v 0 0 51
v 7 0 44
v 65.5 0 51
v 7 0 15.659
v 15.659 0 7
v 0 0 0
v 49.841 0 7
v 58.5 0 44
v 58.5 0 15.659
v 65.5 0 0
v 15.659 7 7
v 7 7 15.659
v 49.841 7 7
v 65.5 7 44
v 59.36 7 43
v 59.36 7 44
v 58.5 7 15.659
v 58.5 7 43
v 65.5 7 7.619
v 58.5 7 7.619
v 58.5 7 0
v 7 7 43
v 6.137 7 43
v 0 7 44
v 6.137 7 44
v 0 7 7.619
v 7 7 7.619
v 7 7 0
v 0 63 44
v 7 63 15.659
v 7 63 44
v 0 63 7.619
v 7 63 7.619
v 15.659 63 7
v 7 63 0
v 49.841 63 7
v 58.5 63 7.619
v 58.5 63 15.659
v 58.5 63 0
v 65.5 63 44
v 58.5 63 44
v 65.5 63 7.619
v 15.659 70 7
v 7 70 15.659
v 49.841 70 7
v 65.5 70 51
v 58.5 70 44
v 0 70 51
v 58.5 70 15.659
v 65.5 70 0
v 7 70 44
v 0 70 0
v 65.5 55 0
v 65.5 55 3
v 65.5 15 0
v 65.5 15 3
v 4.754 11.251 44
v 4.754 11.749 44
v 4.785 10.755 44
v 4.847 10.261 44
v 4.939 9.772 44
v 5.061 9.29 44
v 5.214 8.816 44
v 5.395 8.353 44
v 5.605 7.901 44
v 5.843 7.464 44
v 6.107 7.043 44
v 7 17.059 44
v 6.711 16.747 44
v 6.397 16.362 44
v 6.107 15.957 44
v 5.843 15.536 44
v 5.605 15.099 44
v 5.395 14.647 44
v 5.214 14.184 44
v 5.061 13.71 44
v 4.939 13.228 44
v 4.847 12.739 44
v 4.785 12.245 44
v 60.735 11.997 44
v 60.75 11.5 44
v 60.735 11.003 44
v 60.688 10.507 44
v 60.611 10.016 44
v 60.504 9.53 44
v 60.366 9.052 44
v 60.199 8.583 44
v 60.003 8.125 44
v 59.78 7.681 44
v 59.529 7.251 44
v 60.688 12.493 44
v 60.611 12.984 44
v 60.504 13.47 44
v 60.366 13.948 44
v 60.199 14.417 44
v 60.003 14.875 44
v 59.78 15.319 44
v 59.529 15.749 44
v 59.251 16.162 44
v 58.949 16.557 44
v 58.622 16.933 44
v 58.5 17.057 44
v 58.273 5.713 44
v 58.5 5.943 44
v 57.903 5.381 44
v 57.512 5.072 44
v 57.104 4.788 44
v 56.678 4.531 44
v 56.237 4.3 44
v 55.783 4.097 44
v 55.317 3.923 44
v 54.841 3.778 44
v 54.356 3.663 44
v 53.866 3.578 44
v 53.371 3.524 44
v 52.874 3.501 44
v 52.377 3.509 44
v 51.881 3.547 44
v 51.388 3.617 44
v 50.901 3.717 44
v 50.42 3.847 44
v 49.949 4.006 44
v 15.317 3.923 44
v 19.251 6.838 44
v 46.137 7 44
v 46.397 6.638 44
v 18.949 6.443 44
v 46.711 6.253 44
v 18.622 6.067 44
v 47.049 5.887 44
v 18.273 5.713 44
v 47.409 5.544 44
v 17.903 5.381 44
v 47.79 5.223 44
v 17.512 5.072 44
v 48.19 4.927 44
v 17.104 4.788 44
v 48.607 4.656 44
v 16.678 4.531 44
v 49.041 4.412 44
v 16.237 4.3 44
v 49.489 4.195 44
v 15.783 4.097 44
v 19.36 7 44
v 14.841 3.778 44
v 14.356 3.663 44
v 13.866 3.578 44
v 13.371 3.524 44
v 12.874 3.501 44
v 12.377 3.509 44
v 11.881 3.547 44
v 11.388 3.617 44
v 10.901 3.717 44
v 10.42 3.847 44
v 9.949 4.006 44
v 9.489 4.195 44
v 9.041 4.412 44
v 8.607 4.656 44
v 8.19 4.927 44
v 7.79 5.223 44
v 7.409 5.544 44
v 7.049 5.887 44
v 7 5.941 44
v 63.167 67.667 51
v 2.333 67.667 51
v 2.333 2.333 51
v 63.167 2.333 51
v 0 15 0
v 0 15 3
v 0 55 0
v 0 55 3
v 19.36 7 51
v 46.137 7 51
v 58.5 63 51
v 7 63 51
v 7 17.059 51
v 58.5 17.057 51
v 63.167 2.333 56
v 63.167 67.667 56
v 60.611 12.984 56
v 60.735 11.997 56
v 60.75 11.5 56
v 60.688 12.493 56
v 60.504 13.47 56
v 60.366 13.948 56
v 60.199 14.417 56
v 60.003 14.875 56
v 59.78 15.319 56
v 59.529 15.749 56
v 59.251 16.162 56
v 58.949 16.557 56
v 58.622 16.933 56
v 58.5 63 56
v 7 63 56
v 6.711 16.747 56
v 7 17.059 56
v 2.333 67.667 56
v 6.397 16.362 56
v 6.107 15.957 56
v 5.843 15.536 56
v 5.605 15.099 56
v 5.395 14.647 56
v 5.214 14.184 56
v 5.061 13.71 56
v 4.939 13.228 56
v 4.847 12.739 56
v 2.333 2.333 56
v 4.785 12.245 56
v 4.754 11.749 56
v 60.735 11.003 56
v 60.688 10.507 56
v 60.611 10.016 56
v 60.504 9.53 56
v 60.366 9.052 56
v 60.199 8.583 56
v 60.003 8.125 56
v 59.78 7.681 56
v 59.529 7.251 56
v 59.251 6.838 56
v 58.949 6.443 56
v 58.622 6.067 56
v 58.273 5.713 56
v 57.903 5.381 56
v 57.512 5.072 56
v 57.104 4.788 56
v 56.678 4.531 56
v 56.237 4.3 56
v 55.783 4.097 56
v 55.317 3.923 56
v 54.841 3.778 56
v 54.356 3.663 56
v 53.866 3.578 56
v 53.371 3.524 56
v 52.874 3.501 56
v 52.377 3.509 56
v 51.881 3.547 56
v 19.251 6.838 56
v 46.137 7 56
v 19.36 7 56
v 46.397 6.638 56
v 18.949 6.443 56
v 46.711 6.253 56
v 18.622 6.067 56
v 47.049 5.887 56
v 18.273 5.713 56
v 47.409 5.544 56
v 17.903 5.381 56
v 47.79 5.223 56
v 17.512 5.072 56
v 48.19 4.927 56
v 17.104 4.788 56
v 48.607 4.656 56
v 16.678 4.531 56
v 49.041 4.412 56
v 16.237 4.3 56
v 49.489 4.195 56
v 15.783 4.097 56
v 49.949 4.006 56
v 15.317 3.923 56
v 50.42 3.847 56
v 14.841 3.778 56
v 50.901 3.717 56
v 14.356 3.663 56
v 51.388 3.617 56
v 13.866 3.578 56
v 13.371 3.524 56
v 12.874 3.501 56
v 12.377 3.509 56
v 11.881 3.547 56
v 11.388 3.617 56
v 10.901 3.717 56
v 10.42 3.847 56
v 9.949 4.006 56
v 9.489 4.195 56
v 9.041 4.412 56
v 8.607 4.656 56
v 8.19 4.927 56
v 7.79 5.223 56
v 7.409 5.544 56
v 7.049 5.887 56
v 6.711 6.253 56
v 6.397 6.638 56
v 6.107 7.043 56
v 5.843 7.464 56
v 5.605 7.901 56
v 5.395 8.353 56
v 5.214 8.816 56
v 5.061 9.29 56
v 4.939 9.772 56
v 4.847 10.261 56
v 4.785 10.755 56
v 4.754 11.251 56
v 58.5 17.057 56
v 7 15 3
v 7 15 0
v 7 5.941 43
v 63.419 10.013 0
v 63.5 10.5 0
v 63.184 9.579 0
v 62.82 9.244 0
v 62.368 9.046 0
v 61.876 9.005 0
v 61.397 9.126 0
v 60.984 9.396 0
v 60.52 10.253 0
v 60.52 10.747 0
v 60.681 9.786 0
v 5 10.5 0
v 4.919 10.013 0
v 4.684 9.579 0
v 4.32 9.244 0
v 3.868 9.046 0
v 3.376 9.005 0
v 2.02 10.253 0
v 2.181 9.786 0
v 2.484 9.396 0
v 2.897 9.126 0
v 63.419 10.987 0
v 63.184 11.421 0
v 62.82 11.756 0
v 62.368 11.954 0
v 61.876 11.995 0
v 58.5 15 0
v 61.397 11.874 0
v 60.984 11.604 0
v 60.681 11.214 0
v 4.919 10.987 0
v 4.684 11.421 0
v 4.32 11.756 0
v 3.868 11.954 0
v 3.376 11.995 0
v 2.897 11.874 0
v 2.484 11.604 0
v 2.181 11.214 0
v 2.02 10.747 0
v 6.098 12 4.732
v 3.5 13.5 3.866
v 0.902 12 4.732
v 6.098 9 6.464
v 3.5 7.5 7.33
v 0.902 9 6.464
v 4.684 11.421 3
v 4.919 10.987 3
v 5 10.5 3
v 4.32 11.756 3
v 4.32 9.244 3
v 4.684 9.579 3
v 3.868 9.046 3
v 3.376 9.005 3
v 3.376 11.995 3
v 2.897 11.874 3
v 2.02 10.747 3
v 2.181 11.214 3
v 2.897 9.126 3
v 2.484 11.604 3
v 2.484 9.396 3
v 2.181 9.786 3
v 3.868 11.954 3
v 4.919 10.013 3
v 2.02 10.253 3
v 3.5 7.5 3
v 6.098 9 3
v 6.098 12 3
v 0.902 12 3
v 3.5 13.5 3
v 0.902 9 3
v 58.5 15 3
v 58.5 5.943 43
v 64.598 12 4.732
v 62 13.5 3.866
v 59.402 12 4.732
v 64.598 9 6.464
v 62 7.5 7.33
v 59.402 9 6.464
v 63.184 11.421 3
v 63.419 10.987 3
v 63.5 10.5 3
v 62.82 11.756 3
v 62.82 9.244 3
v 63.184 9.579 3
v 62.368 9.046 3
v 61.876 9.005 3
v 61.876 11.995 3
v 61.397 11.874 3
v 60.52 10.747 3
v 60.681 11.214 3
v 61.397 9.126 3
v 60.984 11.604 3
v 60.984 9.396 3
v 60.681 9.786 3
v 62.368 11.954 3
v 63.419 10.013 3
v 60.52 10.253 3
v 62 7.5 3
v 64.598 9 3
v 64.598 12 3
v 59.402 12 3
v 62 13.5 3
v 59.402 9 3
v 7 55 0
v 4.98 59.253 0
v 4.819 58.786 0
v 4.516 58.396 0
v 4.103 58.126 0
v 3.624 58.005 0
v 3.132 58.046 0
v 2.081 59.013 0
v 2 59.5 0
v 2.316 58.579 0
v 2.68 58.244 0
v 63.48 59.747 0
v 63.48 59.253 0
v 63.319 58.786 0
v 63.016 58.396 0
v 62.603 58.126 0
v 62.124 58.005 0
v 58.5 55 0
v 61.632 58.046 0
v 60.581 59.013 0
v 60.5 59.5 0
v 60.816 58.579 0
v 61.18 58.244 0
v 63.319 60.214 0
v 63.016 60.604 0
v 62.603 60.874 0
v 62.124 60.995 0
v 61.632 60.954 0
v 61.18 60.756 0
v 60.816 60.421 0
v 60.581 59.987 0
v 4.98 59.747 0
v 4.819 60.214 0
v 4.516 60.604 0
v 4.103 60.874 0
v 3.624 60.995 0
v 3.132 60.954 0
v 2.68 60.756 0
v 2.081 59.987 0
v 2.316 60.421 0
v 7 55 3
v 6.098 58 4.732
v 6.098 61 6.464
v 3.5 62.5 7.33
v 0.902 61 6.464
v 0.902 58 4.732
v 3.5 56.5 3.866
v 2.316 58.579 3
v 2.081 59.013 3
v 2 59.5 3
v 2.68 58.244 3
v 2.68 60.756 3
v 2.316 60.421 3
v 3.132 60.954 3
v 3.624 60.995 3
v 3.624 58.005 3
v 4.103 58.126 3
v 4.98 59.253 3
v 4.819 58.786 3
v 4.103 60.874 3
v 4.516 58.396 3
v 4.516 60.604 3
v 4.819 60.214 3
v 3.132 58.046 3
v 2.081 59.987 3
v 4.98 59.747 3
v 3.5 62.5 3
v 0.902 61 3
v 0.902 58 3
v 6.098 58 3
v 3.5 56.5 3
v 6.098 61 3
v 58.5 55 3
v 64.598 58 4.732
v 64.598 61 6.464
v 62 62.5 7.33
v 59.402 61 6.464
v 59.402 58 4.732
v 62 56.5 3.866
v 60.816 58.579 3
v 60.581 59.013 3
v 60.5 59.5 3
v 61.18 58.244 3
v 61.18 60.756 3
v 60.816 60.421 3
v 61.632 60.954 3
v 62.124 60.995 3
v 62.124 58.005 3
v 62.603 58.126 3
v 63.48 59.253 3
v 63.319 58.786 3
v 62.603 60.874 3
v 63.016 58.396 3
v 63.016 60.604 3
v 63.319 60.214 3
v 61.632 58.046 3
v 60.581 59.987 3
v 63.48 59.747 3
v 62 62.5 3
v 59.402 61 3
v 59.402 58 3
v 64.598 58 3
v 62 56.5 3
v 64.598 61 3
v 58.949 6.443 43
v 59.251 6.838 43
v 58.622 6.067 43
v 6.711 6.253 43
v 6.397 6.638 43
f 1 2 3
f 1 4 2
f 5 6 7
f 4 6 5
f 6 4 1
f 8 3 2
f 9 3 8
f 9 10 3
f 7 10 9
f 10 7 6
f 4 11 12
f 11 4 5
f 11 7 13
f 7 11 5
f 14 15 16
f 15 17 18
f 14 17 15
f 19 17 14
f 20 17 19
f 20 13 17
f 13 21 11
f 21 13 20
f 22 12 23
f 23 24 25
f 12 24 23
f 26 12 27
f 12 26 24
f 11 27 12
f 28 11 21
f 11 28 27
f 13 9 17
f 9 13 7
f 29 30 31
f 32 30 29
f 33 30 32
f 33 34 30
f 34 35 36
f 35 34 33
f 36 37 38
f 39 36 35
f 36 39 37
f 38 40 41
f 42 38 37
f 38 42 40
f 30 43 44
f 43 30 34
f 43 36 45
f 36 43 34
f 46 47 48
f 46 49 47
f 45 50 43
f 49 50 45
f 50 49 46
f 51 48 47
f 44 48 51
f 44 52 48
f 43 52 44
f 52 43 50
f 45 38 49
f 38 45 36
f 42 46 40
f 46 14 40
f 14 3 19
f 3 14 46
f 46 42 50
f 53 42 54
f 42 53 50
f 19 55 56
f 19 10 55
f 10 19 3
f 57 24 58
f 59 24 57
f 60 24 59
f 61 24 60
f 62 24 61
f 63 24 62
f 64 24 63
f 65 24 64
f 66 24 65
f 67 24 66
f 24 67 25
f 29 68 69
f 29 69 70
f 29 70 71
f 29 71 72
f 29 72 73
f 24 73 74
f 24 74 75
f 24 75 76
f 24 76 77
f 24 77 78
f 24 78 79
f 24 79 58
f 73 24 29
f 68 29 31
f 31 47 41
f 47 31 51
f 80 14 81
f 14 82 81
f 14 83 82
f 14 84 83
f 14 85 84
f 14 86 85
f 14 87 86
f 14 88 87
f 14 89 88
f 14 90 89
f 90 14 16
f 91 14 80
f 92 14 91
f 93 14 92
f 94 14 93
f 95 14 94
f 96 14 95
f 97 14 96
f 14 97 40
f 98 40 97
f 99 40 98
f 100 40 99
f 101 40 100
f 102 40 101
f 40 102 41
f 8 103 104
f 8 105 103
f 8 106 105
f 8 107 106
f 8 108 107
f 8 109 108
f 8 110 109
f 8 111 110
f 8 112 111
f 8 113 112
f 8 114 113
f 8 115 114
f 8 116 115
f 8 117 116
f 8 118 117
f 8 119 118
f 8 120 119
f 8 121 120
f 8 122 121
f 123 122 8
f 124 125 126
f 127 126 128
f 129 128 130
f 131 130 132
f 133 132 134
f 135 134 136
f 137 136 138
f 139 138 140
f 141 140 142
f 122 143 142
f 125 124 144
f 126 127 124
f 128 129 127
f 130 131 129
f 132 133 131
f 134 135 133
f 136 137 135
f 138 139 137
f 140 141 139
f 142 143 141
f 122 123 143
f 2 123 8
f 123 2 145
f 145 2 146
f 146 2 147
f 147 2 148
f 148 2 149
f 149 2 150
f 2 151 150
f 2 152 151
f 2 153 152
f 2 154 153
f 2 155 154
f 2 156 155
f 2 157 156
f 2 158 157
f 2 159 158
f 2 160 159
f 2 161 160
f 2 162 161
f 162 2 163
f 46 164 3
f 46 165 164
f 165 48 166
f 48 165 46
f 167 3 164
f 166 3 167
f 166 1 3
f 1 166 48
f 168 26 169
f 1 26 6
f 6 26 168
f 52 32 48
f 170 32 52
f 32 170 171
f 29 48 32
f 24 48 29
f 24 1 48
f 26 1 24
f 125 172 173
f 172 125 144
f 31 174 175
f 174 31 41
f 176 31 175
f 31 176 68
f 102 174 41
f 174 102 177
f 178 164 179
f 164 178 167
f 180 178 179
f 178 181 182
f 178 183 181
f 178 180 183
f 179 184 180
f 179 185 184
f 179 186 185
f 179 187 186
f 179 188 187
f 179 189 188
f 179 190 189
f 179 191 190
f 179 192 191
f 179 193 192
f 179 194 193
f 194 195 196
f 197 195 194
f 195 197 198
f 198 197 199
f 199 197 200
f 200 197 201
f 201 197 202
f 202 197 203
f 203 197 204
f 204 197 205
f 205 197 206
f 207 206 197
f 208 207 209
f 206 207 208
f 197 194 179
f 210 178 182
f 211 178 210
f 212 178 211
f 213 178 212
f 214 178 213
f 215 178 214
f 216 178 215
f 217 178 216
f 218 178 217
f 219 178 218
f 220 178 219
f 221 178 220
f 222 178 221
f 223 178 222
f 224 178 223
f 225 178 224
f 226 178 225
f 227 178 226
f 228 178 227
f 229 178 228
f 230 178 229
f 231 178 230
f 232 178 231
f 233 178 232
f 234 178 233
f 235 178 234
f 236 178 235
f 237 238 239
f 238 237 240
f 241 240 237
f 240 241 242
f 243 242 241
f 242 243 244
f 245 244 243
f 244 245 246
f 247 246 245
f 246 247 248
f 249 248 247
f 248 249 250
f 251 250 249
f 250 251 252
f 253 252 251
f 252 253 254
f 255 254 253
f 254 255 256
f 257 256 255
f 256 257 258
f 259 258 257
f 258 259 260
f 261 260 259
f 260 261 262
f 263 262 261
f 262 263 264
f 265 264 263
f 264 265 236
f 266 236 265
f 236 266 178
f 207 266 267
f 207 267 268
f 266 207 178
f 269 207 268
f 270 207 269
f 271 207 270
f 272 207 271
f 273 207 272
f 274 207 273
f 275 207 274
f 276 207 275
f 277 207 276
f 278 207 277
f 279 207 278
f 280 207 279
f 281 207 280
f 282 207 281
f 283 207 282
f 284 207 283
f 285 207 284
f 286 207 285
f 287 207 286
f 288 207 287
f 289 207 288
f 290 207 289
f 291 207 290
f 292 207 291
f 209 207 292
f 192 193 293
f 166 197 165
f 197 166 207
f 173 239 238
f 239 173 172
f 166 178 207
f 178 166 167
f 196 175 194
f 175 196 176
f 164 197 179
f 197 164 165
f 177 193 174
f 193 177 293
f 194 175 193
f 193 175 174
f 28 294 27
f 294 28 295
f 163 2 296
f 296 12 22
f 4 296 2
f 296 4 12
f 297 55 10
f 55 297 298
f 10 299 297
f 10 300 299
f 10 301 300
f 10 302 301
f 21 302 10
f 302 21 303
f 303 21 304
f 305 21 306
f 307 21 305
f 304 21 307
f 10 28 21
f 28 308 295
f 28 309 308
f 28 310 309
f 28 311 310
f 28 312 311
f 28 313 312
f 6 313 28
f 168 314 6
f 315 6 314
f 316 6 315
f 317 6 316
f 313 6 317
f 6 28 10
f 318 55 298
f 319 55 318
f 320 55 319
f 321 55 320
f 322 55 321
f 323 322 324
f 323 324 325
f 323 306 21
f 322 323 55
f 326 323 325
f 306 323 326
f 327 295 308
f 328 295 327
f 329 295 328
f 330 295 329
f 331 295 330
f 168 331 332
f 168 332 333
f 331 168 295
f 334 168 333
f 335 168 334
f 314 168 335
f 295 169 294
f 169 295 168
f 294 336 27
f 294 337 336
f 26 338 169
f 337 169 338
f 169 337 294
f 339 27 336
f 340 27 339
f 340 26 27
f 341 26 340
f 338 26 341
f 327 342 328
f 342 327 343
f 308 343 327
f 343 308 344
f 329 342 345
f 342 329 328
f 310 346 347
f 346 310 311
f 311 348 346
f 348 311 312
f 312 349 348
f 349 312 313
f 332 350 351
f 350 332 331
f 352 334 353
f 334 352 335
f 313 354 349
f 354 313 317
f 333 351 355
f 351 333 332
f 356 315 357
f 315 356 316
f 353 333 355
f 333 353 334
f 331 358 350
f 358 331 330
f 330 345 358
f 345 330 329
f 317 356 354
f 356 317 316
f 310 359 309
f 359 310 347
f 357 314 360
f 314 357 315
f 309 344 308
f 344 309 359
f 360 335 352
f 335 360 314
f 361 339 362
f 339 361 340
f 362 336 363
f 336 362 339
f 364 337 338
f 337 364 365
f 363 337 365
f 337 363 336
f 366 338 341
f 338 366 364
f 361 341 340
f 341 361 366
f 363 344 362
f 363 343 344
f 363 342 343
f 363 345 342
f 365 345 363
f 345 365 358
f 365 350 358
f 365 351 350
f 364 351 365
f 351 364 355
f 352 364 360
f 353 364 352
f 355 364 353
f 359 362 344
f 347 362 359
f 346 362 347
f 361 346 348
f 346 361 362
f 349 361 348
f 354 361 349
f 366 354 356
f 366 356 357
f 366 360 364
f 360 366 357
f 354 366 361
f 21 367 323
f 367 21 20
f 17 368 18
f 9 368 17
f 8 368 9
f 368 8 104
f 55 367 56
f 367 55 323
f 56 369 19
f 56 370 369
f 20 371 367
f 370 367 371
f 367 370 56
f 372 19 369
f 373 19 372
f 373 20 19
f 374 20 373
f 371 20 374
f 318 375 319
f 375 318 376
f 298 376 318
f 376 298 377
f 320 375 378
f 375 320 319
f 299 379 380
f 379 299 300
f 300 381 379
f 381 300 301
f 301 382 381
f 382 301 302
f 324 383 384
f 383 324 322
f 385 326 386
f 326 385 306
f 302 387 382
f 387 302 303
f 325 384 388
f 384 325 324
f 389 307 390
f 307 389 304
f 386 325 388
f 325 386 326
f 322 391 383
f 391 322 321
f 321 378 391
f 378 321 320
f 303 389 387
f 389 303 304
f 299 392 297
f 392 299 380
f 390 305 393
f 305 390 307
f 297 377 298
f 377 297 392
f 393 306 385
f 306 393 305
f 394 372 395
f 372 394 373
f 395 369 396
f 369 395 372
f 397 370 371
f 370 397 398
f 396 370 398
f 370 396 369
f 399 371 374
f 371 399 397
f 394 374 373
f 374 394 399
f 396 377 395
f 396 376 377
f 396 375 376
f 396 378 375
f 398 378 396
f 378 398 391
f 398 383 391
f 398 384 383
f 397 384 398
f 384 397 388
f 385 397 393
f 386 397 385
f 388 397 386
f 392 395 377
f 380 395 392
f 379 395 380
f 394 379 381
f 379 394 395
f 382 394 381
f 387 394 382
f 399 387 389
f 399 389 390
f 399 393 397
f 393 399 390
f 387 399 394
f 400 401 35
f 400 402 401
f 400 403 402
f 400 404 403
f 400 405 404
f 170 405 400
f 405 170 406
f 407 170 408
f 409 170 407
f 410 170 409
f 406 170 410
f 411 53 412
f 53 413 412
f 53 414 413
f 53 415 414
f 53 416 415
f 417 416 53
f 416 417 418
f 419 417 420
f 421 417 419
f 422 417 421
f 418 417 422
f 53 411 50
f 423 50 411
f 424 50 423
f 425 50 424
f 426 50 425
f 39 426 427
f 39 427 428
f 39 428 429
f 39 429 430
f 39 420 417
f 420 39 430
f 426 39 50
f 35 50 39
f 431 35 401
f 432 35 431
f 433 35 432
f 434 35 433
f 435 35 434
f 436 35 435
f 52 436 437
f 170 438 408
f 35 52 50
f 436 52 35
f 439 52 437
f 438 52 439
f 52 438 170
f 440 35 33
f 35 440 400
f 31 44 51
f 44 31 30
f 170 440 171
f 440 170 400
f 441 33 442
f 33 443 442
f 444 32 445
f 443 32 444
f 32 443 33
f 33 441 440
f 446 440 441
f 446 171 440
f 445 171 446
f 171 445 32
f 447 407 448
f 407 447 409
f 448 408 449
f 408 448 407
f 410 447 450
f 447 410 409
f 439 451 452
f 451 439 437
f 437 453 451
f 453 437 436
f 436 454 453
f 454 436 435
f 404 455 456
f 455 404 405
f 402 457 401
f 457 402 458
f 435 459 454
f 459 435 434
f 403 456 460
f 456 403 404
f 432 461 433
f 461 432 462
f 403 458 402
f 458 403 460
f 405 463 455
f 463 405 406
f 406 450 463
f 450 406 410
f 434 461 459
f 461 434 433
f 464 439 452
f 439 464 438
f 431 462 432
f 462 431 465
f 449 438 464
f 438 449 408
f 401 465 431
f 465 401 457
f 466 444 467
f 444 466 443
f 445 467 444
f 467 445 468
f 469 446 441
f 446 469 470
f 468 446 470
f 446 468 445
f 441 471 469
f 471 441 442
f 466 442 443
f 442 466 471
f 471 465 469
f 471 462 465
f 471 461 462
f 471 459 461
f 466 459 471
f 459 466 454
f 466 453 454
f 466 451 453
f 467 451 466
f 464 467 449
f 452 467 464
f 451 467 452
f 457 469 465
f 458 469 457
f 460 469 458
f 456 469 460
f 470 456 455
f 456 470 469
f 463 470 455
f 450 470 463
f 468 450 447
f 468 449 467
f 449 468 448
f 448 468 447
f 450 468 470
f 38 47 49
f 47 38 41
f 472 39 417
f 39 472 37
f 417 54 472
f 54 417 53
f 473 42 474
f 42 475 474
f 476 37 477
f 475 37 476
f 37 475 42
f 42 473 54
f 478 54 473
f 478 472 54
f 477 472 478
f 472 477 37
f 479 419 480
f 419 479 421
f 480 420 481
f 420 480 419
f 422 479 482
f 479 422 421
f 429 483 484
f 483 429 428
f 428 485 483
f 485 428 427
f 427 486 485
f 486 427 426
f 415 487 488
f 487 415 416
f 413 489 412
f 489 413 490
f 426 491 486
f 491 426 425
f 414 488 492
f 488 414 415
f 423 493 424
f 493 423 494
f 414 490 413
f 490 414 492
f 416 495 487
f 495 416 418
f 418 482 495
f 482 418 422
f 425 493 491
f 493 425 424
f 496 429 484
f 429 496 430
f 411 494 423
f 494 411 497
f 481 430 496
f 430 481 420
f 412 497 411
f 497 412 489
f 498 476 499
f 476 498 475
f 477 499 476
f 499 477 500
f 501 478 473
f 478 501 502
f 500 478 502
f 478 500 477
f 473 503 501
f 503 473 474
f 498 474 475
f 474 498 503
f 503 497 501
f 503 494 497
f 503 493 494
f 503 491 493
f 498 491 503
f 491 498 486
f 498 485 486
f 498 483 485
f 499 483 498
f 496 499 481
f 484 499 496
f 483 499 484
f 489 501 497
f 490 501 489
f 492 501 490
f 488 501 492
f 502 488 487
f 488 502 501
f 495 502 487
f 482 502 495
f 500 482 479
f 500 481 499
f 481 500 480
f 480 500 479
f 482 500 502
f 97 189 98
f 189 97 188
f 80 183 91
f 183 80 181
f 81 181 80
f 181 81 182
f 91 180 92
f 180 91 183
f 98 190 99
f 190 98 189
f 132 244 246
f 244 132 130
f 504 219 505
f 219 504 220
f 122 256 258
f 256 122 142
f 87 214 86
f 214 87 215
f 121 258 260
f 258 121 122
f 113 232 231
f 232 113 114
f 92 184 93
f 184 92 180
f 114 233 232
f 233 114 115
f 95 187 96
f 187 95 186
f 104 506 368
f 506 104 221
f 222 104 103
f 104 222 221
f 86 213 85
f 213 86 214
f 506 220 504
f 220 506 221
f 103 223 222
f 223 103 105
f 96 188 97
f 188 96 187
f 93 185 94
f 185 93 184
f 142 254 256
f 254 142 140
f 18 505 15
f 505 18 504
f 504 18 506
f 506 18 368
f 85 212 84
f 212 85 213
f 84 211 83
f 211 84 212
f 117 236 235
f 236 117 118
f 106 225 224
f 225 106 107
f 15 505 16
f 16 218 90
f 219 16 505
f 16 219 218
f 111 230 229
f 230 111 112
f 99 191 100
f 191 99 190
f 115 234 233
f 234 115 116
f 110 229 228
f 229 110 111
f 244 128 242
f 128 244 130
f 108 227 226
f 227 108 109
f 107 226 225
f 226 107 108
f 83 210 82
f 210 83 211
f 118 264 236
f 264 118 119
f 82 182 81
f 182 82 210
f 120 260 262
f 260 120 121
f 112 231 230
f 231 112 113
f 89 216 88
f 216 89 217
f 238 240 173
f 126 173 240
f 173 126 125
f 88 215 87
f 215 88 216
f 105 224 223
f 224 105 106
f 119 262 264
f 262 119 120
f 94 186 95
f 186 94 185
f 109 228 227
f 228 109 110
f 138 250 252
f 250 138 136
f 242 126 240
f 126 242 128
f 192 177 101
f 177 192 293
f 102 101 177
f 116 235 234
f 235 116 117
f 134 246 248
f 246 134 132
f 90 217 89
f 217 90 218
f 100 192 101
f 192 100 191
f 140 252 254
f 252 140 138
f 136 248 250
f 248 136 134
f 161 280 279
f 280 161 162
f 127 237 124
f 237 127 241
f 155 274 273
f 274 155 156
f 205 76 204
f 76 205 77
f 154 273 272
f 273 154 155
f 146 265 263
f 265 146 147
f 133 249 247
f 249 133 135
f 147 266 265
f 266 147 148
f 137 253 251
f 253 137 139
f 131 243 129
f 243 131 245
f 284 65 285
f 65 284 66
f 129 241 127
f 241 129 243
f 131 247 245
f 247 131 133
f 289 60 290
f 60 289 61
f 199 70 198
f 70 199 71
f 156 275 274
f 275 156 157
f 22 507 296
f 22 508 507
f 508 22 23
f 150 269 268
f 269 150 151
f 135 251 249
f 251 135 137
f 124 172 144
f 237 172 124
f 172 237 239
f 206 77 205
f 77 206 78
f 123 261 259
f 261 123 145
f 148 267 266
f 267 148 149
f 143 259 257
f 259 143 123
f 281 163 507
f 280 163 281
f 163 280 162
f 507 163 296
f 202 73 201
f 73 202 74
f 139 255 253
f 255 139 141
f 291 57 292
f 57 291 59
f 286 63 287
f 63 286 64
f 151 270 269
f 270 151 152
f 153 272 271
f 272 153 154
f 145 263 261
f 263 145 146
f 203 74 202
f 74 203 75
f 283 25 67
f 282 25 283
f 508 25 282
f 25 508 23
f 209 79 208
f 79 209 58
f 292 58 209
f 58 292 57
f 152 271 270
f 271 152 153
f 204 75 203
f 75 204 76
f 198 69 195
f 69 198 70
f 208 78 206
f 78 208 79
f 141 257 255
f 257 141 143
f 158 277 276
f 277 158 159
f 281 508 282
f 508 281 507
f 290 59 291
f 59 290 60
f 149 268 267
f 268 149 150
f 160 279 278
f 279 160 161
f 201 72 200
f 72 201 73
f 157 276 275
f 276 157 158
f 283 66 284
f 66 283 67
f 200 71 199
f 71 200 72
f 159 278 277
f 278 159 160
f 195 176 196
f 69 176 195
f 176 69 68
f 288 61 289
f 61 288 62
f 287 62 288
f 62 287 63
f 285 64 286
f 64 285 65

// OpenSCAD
// file: prism.scad
module prism(l, w, h) {
       polyhedron(points=[
               [0,0,h],           // 0    front top corner
               [0,0,0],[w,0,0],   // 1, 2 front left & right bottom corners
               [0,l,h],           // 3    back top corner
               [0,l,0],[w,l,0]    // 4, 5 back left & right bottom corners
       ], faces=[ // points for all faces must be ordered clockwise when looking in
               [0,2,1],    // top face
               [3,4,5],    // base face
               [0,1,4,3],  // h face
               [1,2,5,4],  // w face
               [0,3,5,2],  // hypotenuse face
       ]);
}

//rotate([180,0,0]) prism(l=5, w=3, h=5);
// main file
/*

Structure that connects to the Raspberry Pi and holds the camera translation stage above it. 
top.scad fits onto the top, the cylindrical spaces in the fitting make room for screws.

*/

include <prism.scad>;

$fa = 0.5;
$fs = 0.5;

bolt_separation = 49;

//height of the setup, NOT including the "fitting"
height = 51;

//dimensions of the "feet", part of the legs which stick out and have holes to attach to the Raspberry Pi
foot_width = 7;
foot_length = 6 + 0.5 + 0.5 + 1;
foot_thickness = 3;
//radii of the holes in the feet
foot_r = 1.5;
nut_r = 3;

//distance by which the structure is larger than the Raspberry Pi board, which therefore corresponds to the thickness of the legs ang "beam" which connect the legs
extra = 7;

//the - 1 is since the holes in the feel arent at foot_length/2 but at foot_length/2 - 0.5.
top_width = bolt_separation + 2*extra + foot_length - 1;
//the last +0.5 is tolerance so that the legs aren't that close to the actual LEDs
top_length = 58 + 3 + 3 + 0.5 + 0.5 + 0.5;
top_length = (58 + 3 + 3 + 0.5 + 0.5) + 0.5;
top_thickness = 2;

total_length = 85;
beam_height = extra;
fitting_height = 5;
//the corresponding fitting on top.scad is extra/3 minus some tolerance
fitting_width = extra/3*2;

angle = 30;
prism_height = (foot_length+extra) * tan(angle);

hole_height = 2.5;
hole_r = 2;

module leg(){
    
    difference(){
        union(){
            //foot
            cube([foot_width,foot_length+extra,foot_thickness]);
            //leg
            cube([foot_width, extra, height]);
            //prism
            rotate([0,0,90]) translate([0,-foot_width,foot_thickness]) prism(foot_width,foot_length + extra,prism_height);
        };
        
        translate([foot_width/2, extra+foot_length/2 - 0.5,-1]) 
        union(){
           cylinder(r=foot_r, h=foot_thickness+2);
           translate([0,0,1+foot_thickness]) rotate([0,0,30]) cylinder(r=nut_r, h=prism_height, $fn = 6);
        };
    };
};


// beam refers to the horizontal cuboids that connect the "legs"
module beam(length){
    cube([length,extra,beam_height]); 
};

// fitting refers to the square at the top of the structure, that is meant to fit into the "fitting" on top.scad
module fitting(width,length,thickness){
    cube([length,thickness,fitting_height]);
    cube([thickness,width,fitting_height]);
    translate([length-thickness,0,0]) cube([thickness,width,fitting_height]);
    translate([0,width-thickness,0]) cube([length,thickness,fitting_height]);
}






//lower beams
beam(top_length);
translate([0,top_width-extra,0]) beam(top_length);
union(){
        translate([foot_width-0.001,0,beam_height]) prism(extra,prism_height,prism_height);
        rotate([0,0,180]) translate([-0.001-top_length+foot_width,-extra,beam_height]) prism(extra,prism_height,prism_height);
    };
translate([0,top_width-extra,0]) union(){
        translate([foot_width-0.001,0,beam_height]) prism(extra,prism_height,prism_height);
        rotate([0,0,180]) translate([-0.001-top_length+foot_width,-extra,beam_height]) prism(extra,prism_height,prism_height);
    };


difference(){
    union(){
        //higher beams
        translate([0,extra,height]) rotate([180,0,0]){
            beam(top_length);
            translate([0,-top_width+extra,0]) beam(top_length);
        };
        translate([0,0,height]) rotate([180,0,90]){
            beam(top_width);
            translate([0,top_length-foot_width,0]) beam(top_width);
            
        };



        //fitting
        translate([foot_width-fitting_width,extra-fitting_width,height]) fitting(length=top_length-2*foot_width+2*fitting_width, width = top_width-2*extra+2*fitting_width,thickness = fitting_width);
        
        //make 4 legs in the correct positions
        leg();
        translate([top_length-foot_width,0,0]) leg();
        translate([foot_width,top_width,0]) rotate([0,0,180]) leg();
        translate([top_length,top_width,0]) rotate([0,0,180]) leg();
    };
    
    //Cutouts for the screws used to attach the translation stage to the top.scad. These values should be the same as in top.scad.
    aperture_x = top_length/2;
    aperture_y = top_width/2 -1;
    attachment_separation = 40;
    attachment_r = 9;
    aperture_to_attachment = 22.5;

    translate([0,0,height-2]){
        translate([aperture_x+attachment_separation/2,aperture_y-aperture_to_attachment,-fitting_height-1]) cylinder(r=attachment_r-1,h=top_thickness+fitting_height+8);
        translate([aperture_x-attachment_separation/2,aperture_y-aperture_to_attachment,-fitting_height-1]) cylinder(r=attachment_r-1,h=top_thickness+fitting_height+8);
    }
    };
